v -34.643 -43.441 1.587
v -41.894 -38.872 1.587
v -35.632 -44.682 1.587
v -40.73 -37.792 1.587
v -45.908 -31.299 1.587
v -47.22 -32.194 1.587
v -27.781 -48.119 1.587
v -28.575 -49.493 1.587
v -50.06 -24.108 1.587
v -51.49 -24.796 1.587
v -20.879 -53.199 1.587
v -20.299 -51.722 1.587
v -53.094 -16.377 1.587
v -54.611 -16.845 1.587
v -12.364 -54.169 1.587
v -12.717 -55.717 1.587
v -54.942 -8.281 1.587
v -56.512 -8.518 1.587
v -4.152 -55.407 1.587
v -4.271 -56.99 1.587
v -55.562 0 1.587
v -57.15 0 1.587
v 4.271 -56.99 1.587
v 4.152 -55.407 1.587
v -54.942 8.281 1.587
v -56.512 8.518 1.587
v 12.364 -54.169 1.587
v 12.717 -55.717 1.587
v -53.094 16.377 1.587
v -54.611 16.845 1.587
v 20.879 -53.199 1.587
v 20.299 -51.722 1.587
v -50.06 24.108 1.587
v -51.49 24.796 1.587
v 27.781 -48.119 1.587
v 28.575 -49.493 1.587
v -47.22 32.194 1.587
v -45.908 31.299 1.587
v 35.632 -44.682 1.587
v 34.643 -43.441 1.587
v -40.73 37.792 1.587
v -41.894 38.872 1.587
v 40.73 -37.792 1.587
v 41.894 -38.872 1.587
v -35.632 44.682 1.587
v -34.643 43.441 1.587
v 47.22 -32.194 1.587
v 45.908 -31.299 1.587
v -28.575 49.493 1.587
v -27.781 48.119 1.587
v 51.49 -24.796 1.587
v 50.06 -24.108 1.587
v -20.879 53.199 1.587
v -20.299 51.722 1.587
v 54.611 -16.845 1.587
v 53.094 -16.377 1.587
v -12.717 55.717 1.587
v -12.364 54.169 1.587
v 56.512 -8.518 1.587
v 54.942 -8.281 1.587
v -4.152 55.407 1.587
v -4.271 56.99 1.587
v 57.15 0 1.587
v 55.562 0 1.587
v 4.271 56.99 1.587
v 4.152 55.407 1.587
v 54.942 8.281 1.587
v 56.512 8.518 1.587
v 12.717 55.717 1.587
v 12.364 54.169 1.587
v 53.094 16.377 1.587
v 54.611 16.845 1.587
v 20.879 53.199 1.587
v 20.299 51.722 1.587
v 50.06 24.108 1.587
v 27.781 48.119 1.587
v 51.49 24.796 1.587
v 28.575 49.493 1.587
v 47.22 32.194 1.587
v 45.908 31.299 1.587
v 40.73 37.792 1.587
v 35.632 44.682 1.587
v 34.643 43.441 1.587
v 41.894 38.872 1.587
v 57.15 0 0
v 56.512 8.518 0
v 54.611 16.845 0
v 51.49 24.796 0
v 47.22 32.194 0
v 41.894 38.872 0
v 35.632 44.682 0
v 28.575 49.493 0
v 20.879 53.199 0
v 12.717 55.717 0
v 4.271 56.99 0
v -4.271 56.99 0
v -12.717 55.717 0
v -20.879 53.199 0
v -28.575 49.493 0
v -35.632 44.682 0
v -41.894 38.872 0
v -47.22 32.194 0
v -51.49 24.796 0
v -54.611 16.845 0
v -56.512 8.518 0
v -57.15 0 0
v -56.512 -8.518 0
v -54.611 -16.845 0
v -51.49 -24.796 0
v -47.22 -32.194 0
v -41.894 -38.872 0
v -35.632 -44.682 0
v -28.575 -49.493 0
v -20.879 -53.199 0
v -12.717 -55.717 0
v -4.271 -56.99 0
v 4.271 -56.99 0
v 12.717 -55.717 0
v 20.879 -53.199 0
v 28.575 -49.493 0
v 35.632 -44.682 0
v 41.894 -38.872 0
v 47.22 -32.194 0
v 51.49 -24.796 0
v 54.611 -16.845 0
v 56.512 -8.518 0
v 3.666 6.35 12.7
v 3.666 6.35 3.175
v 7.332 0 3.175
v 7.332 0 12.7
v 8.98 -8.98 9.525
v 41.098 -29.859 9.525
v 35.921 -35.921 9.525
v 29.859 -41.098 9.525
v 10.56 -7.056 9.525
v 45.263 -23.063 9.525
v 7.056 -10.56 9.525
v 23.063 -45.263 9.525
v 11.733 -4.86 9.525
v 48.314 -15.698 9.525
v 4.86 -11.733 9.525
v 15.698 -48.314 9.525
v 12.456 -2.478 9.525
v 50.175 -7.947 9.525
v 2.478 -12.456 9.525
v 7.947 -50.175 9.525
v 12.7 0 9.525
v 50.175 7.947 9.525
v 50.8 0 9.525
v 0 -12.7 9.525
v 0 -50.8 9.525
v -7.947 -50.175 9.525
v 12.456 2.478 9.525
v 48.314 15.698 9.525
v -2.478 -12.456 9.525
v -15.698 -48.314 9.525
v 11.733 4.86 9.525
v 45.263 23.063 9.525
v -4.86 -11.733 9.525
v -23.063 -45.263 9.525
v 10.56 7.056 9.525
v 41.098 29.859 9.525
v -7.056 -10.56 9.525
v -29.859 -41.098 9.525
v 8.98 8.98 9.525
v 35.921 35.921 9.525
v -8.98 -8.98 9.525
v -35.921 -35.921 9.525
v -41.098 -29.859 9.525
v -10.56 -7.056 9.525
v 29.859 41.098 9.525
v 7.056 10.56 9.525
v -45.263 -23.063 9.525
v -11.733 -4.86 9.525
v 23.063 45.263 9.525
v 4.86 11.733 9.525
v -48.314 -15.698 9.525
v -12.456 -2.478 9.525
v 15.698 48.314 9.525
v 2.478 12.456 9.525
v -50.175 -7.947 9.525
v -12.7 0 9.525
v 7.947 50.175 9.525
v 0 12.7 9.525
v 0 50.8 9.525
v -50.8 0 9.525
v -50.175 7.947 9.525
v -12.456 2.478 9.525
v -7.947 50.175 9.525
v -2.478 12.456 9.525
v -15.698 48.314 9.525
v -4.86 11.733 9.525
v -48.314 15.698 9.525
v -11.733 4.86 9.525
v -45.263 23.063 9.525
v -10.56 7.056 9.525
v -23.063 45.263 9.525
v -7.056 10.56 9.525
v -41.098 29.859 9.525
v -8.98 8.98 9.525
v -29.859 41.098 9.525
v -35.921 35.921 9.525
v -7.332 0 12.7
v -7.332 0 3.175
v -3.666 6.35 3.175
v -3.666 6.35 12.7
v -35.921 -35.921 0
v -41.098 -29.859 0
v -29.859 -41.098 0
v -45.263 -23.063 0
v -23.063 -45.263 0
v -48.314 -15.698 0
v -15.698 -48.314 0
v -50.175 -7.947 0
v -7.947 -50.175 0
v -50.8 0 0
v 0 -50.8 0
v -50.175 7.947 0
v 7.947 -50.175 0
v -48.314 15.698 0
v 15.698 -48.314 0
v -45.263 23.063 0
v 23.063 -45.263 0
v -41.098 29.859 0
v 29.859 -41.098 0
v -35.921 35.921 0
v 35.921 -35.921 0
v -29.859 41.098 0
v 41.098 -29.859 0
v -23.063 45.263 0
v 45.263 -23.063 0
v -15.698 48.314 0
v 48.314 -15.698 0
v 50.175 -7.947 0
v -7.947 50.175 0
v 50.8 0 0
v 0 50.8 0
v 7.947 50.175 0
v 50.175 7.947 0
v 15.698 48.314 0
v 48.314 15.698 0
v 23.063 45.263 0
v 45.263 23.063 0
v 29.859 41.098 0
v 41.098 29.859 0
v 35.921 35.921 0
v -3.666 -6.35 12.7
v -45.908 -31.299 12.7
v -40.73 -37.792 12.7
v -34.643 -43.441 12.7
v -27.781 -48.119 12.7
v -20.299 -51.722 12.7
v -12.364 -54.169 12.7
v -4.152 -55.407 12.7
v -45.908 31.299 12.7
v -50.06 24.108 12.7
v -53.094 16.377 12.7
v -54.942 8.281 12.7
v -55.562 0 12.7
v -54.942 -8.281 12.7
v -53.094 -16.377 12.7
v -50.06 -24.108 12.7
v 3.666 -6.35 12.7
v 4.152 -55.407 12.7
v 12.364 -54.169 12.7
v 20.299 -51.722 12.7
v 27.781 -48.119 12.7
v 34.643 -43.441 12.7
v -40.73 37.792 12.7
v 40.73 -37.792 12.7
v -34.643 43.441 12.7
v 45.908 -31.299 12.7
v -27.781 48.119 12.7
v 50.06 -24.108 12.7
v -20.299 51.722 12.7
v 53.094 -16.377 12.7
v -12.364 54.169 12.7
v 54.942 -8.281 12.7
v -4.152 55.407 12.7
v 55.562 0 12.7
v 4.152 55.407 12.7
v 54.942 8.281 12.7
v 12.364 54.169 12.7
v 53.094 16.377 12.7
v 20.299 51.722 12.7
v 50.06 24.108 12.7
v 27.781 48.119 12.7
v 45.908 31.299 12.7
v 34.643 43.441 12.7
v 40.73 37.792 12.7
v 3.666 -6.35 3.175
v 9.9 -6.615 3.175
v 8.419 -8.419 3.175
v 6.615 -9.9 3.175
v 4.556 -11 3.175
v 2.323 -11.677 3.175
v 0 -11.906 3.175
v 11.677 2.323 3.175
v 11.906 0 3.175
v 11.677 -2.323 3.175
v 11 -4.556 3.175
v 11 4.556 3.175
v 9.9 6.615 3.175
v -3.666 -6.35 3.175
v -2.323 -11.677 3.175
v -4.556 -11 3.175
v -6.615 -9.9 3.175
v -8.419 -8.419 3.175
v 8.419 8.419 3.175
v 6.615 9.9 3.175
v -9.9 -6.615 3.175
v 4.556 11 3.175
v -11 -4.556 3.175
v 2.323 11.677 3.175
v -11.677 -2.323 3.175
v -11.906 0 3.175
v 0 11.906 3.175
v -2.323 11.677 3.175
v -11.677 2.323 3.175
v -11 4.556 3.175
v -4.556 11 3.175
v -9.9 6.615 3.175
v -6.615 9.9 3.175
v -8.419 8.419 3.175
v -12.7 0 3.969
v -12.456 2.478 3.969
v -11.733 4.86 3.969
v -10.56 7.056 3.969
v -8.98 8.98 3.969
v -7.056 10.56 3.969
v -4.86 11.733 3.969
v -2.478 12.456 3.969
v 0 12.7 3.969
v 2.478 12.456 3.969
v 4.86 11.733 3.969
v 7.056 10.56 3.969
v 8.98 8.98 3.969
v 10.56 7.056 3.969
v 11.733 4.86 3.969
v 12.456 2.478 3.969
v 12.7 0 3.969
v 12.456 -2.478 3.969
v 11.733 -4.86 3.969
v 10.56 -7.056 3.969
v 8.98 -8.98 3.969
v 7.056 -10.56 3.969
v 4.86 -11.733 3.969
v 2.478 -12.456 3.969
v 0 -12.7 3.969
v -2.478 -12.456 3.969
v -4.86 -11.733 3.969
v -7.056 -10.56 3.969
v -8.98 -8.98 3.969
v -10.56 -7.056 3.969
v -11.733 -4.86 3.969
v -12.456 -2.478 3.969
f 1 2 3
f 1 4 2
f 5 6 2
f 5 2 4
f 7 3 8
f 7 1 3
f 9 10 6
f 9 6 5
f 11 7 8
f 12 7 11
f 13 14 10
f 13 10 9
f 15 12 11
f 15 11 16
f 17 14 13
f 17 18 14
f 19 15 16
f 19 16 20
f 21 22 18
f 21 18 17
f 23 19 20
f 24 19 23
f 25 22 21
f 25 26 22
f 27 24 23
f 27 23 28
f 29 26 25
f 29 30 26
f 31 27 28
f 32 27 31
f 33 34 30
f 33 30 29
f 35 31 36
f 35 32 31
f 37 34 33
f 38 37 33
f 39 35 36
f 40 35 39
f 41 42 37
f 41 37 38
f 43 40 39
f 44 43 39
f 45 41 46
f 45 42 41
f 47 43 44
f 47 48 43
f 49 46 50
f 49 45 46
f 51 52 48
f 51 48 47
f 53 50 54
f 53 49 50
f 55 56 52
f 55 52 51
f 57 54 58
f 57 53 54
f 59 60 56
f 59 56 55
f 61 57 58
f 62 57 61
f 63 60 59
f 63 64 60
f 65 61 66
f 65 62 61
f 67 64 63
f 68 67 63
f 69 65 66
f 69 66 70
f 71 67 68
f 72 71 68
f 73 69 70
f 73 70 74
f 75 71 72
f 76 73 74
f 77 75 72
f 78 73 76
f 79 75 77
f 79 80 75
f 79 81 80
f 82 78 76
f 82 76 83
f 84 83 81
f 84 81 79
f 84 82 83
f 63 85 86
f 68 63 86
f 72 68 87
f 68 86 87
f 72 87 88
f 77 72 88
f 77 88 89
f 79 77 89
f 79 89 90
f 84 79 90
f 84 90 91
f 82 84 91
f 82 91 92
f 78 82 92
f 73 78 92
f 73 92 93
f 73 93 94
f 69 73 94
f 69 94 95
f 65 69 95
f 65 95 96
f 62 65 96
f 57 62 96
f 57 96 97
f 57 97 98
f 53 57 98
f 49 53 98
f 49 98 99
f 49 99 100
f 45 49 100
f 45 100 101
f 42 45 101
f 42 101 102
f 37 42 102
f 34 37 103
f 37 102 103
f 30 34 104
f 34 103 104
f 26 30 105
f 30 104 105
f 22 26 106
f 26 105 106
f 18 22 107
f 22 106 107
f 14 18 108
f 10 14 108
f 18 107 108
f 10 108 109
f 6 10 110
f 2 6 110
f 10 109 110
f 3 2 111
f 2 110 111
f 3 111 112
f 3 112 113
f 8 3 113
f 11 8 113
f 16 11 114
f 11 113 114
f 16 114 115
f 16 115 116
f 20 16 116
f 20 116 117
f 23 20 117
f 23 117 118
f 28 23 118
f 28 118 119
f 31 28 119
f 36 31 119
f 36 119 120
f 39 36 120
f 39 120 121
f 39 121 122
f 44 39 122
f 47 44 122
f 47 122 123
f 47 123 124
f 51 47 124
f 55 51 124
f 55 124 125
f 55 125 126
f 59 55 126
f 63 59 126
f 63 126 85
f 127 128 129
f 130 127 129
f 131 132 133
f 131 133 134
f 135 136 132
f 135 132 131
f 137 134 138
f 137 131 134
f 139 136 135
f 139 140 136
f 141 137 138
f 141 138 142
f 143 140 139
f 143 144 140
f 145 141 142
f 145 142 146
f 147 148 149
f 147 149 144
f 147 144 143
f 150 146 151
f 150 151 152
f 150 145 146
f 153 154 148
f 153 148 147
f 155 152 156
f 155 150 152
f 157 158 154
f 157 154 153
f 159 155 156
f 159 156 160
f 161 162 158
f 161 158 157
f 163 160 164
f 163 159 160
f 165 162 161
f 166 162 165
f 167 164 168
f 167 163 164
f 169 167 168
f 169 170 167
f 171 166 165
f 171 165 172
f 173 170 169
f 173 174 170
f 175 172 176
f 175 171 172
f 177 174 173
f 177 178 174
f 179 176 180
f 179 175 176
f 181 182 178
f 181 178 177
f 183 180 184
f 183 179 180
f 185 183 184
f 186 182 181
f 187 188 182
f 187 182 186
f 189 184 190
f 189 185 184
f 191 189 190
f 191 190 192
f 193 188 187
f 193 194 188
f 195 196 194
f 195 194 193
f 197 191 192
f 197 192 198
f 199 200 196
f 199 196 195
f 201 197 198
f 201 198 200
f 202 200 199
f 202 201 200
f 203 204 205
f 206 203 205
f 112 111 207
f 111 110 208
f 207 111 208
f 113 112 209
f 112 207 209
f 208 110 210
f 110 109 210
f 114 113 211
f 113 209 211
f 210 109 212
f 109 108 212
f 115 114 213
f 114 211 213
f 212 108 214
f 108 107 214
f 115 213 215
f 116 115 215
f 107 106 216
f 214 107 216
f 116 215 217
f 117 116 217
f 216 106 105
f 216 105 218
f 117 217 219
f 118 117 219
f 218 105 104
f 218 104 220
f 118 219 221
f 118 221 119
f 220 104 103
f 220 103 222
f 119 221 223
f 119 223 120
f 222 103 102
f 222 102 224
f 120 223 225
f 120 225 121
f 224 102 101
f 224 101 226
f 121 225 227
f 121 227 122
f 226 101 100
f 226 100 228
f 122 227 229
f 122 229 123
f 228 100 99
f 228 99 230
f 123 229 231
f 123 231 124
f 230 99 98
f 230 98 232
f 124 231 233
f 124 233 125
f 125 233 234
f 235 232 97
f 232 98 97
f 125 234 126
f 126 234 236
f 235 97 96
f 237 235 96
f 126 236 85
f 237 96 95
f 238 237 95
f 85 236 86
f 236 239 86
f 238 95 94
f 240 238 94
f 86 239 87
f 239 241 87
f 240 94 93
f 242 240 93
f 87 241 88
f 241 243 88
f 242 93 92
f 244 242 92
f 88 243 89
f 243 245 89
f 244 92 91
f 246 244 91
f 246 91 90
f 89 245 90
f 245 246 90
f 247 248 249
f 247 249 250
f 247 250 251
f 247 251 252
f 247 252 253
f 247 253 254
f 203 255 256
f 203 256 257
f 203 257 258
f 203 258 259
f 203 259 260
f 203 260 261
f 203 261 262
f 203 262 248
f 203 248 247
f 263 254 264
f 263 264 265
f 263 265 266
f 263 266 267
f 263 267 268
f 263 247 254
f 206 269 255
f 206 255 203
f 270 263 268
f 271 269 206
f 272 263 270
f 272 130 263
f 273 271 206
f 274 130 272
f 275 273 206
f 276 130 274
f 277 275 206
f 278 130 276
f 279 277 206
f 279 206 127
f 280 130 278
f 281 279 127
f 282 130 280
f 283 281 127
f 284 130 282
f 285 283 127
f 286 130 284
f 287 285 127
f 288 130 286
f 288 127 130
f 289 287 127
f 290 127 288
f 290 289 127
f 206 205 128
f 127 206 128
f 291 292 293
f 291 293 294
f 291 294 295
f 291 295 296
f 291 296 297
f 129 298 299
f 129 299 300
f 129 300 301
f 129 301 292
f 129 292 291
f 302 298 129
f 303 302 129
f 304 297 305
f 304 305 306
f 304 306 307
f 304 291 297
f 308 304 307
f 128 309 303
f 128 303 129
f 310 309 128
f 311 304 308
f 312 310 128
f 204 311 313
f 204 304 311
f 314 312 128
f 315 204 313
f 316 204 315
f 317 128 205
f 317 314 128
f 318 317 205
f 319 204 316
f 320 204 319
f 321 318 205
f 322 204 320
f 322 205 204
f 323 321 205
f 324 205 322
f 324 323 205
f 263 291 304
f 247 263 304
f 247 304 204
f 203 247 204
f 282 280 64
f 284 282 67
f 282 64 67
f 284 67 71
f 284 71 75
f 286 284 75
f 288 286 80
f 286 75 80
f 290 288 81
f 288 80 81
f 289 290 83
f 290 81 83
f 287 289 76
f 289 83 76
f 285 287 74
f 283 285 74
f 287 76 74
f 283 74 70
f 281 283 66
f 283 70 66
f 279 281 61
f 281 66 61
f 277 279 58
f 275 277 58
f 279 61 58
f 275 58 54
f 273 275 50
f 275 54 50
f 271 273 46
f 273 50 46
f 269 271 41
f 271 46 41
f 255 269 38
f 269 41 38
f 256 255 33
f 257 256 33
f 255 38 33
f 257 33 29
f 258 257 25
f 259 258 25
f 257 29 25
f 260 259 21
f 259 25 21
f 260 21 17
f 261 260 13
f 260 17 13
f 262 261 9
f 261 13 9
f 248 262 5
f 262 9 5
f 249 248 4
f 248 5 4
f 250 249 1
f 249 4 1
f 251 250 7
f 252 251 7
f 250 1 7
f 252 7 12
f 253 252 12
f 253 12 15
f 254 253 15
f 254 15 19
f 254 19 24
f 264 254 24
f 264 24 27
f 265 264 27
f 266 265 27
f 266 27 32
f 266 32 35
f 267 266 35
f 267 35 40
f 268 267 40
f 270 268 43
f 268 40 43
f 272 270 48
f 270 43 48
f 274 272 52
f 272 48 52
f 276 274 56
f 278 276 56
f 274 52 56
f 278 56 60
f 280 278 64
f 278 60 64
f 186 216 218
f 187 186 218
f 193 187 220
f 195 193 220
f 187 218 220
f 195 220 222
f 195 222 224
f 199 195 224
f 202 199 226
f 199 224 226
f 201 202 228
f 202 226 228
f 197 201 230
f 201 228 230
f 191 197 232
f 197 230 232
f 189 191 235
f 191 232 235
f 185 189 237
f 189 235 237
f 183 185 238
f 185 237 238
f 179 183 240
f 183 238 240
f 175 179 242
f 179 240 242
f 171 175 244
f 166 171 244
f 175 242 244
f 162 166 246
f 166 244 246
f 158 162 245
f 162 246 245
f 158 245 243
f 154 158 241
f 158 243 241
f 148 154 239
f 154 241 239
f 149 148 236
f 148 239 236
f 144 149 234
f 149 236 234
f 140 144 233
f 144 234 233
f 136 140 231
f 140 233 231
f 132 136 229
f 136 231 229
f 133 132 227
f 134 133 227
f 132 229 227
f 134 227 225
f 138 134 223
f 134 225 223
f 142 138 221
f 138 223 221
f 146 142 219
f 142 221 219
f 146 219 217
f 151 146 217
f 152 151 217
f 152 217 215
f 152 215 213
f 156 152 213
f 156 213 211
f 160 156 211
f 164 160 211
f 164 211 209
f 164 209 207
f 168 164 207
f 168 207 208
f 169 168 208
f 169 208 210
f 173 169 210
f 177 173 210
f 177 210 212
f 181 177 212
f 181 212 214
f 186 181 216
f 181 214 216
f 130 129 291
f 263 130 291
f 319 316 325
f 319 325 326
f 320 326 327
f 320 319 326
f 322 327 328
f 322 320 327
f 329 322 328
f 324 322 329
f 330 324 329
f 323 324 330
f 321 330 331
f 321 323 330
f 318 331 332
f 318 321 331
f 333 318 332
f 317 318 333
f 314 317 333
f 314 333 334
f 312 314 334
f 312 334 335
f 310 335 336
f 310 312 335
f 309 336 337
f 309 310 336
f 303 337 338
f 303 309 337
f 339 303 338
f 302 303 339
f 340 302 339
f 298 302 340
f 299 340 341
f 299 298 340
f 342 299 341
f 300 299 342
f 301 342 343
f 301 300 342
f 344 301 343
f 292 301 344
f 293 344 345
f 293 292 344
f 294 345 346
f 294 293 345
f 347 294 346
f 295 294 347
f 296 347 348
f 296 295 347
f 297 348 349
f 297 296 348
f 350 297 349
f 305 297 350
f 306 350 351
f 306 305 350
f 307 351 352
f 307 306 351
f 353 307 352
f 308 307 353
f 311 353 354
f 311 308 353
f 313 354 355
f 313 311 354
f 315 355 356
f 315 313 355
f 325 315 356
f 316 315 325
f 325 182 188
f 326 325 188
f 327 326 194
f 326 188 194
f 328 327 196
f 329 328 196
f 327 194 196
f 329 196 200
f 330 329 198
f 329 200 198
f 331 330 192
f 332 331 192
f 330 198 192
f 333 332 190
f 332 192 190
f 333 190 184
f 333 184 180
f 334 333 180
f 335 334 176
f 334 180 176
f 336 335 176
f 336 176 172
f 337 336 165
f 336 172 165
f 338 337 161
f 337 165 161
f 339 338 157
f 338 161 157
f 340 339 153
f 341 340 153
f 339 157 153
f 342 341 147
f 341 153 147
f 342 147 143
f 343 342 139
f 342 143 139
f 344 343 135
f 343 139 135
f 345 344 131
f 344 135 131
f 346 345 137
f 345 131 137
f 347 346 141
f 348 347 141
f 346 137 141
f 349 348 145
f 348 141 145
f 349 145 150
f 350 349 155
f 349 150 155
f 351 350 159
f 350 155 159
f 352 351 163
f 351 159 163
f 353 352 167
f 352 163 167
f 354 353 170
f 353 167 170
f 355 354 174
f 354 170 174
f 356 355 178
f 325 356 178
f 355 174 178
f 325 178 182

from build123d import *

# Parameters (mm, degrees)
SKETCH1_R           = 57.15
BOSS_EXTRUDE1_DEPTH = 12.7
CUT_EXTRUDE1_START  = -11.1125
SKETCH2_R           = 57.15
SKETCH2_R_2         = 55.5625
CUT_EXTRUDE1_DEPTH  = 11.1125
SKETCH3_R           = 50.8
CUT_EXTRUDE2_DEPTH  = 9.525
SKETCH4_R           = 12.7
BOSS_EXTRUDE2_DEPTH = 6.35
CUT_EXTRUDE4_DEPTH  = 12.7
CHAMFER1_SIZE       = 0.79375


with BuildPart() as part:
    # Sketch1 → Boss-Extrude1 (new body)
    with BuildSketch(Plane.XY):
        Circle(SKETCH1_R)
    extrude(amount=BOSS_EXTRUDE1_DEPTH)

    # Sketch2 → Cut-Extrude1 (cut)
    with BuildSketch(Plane.XY.offset(12.7).offset(CUT_EXTRUDE1_START)):
        Circle(SKETCH2_R)
        Circle(SKETCH2_R_2, mode=Mode.SUBTRACT)
    extrude(amount=CUT_EXTRUDE1_DEPTH, mode=Mode.SUBTRACT)

    # Sketch3 → Cut-Extrude2 (cut)
    with BuildSketch(Plane(origin=(0, 0, 0), x_dir=(-1, 0, 0), z_dir=(0, 0, -1))):
        Circle(SKETCH3_R)
    extrude(amount=-CUT_EXTRUDE2_DEPTH, mode=Mode.SUBTRACT)

    # Sketch4 → Boss-Extrude2 (add)
    with BuildSketch(Plane(origin=(0, 0, 9.525), x_dir=(-1, 0, 0), z_dir=(0, 0, -1))):
        Circle(SKETCH4_R)
    extrude(amount=BOSS_EXTRUDE2_DEPTH)

    # Sketch6 → Cut-Extrude4 (cut)
    with BuildSketch(Plane(origin=(0, 0, 3.175), x_dir=(-1, 0, 0), z_dir=(0, 0, -1))):
        Polygon((7.332348419, 0), (3.666174209, 6.35), (-3.666174209, 6.35), (-7.332348419, 0), (-3.666174209, -6.35), (3.666174209, -6.35), align=None)
    extrude(amount=-CUT_EXTRUDE4_DEPTH, mode=Mode.SUBTRACT)

    # Chamfer1
    chamfer1_edges = [part.edges().sort_by_distance(p)[0] for p in [
        (12.7, 0, 3.175),
    ]]
    chamfer(chamfer1_edges, length=CHAMFER1_SIZE)


solid = part.part
